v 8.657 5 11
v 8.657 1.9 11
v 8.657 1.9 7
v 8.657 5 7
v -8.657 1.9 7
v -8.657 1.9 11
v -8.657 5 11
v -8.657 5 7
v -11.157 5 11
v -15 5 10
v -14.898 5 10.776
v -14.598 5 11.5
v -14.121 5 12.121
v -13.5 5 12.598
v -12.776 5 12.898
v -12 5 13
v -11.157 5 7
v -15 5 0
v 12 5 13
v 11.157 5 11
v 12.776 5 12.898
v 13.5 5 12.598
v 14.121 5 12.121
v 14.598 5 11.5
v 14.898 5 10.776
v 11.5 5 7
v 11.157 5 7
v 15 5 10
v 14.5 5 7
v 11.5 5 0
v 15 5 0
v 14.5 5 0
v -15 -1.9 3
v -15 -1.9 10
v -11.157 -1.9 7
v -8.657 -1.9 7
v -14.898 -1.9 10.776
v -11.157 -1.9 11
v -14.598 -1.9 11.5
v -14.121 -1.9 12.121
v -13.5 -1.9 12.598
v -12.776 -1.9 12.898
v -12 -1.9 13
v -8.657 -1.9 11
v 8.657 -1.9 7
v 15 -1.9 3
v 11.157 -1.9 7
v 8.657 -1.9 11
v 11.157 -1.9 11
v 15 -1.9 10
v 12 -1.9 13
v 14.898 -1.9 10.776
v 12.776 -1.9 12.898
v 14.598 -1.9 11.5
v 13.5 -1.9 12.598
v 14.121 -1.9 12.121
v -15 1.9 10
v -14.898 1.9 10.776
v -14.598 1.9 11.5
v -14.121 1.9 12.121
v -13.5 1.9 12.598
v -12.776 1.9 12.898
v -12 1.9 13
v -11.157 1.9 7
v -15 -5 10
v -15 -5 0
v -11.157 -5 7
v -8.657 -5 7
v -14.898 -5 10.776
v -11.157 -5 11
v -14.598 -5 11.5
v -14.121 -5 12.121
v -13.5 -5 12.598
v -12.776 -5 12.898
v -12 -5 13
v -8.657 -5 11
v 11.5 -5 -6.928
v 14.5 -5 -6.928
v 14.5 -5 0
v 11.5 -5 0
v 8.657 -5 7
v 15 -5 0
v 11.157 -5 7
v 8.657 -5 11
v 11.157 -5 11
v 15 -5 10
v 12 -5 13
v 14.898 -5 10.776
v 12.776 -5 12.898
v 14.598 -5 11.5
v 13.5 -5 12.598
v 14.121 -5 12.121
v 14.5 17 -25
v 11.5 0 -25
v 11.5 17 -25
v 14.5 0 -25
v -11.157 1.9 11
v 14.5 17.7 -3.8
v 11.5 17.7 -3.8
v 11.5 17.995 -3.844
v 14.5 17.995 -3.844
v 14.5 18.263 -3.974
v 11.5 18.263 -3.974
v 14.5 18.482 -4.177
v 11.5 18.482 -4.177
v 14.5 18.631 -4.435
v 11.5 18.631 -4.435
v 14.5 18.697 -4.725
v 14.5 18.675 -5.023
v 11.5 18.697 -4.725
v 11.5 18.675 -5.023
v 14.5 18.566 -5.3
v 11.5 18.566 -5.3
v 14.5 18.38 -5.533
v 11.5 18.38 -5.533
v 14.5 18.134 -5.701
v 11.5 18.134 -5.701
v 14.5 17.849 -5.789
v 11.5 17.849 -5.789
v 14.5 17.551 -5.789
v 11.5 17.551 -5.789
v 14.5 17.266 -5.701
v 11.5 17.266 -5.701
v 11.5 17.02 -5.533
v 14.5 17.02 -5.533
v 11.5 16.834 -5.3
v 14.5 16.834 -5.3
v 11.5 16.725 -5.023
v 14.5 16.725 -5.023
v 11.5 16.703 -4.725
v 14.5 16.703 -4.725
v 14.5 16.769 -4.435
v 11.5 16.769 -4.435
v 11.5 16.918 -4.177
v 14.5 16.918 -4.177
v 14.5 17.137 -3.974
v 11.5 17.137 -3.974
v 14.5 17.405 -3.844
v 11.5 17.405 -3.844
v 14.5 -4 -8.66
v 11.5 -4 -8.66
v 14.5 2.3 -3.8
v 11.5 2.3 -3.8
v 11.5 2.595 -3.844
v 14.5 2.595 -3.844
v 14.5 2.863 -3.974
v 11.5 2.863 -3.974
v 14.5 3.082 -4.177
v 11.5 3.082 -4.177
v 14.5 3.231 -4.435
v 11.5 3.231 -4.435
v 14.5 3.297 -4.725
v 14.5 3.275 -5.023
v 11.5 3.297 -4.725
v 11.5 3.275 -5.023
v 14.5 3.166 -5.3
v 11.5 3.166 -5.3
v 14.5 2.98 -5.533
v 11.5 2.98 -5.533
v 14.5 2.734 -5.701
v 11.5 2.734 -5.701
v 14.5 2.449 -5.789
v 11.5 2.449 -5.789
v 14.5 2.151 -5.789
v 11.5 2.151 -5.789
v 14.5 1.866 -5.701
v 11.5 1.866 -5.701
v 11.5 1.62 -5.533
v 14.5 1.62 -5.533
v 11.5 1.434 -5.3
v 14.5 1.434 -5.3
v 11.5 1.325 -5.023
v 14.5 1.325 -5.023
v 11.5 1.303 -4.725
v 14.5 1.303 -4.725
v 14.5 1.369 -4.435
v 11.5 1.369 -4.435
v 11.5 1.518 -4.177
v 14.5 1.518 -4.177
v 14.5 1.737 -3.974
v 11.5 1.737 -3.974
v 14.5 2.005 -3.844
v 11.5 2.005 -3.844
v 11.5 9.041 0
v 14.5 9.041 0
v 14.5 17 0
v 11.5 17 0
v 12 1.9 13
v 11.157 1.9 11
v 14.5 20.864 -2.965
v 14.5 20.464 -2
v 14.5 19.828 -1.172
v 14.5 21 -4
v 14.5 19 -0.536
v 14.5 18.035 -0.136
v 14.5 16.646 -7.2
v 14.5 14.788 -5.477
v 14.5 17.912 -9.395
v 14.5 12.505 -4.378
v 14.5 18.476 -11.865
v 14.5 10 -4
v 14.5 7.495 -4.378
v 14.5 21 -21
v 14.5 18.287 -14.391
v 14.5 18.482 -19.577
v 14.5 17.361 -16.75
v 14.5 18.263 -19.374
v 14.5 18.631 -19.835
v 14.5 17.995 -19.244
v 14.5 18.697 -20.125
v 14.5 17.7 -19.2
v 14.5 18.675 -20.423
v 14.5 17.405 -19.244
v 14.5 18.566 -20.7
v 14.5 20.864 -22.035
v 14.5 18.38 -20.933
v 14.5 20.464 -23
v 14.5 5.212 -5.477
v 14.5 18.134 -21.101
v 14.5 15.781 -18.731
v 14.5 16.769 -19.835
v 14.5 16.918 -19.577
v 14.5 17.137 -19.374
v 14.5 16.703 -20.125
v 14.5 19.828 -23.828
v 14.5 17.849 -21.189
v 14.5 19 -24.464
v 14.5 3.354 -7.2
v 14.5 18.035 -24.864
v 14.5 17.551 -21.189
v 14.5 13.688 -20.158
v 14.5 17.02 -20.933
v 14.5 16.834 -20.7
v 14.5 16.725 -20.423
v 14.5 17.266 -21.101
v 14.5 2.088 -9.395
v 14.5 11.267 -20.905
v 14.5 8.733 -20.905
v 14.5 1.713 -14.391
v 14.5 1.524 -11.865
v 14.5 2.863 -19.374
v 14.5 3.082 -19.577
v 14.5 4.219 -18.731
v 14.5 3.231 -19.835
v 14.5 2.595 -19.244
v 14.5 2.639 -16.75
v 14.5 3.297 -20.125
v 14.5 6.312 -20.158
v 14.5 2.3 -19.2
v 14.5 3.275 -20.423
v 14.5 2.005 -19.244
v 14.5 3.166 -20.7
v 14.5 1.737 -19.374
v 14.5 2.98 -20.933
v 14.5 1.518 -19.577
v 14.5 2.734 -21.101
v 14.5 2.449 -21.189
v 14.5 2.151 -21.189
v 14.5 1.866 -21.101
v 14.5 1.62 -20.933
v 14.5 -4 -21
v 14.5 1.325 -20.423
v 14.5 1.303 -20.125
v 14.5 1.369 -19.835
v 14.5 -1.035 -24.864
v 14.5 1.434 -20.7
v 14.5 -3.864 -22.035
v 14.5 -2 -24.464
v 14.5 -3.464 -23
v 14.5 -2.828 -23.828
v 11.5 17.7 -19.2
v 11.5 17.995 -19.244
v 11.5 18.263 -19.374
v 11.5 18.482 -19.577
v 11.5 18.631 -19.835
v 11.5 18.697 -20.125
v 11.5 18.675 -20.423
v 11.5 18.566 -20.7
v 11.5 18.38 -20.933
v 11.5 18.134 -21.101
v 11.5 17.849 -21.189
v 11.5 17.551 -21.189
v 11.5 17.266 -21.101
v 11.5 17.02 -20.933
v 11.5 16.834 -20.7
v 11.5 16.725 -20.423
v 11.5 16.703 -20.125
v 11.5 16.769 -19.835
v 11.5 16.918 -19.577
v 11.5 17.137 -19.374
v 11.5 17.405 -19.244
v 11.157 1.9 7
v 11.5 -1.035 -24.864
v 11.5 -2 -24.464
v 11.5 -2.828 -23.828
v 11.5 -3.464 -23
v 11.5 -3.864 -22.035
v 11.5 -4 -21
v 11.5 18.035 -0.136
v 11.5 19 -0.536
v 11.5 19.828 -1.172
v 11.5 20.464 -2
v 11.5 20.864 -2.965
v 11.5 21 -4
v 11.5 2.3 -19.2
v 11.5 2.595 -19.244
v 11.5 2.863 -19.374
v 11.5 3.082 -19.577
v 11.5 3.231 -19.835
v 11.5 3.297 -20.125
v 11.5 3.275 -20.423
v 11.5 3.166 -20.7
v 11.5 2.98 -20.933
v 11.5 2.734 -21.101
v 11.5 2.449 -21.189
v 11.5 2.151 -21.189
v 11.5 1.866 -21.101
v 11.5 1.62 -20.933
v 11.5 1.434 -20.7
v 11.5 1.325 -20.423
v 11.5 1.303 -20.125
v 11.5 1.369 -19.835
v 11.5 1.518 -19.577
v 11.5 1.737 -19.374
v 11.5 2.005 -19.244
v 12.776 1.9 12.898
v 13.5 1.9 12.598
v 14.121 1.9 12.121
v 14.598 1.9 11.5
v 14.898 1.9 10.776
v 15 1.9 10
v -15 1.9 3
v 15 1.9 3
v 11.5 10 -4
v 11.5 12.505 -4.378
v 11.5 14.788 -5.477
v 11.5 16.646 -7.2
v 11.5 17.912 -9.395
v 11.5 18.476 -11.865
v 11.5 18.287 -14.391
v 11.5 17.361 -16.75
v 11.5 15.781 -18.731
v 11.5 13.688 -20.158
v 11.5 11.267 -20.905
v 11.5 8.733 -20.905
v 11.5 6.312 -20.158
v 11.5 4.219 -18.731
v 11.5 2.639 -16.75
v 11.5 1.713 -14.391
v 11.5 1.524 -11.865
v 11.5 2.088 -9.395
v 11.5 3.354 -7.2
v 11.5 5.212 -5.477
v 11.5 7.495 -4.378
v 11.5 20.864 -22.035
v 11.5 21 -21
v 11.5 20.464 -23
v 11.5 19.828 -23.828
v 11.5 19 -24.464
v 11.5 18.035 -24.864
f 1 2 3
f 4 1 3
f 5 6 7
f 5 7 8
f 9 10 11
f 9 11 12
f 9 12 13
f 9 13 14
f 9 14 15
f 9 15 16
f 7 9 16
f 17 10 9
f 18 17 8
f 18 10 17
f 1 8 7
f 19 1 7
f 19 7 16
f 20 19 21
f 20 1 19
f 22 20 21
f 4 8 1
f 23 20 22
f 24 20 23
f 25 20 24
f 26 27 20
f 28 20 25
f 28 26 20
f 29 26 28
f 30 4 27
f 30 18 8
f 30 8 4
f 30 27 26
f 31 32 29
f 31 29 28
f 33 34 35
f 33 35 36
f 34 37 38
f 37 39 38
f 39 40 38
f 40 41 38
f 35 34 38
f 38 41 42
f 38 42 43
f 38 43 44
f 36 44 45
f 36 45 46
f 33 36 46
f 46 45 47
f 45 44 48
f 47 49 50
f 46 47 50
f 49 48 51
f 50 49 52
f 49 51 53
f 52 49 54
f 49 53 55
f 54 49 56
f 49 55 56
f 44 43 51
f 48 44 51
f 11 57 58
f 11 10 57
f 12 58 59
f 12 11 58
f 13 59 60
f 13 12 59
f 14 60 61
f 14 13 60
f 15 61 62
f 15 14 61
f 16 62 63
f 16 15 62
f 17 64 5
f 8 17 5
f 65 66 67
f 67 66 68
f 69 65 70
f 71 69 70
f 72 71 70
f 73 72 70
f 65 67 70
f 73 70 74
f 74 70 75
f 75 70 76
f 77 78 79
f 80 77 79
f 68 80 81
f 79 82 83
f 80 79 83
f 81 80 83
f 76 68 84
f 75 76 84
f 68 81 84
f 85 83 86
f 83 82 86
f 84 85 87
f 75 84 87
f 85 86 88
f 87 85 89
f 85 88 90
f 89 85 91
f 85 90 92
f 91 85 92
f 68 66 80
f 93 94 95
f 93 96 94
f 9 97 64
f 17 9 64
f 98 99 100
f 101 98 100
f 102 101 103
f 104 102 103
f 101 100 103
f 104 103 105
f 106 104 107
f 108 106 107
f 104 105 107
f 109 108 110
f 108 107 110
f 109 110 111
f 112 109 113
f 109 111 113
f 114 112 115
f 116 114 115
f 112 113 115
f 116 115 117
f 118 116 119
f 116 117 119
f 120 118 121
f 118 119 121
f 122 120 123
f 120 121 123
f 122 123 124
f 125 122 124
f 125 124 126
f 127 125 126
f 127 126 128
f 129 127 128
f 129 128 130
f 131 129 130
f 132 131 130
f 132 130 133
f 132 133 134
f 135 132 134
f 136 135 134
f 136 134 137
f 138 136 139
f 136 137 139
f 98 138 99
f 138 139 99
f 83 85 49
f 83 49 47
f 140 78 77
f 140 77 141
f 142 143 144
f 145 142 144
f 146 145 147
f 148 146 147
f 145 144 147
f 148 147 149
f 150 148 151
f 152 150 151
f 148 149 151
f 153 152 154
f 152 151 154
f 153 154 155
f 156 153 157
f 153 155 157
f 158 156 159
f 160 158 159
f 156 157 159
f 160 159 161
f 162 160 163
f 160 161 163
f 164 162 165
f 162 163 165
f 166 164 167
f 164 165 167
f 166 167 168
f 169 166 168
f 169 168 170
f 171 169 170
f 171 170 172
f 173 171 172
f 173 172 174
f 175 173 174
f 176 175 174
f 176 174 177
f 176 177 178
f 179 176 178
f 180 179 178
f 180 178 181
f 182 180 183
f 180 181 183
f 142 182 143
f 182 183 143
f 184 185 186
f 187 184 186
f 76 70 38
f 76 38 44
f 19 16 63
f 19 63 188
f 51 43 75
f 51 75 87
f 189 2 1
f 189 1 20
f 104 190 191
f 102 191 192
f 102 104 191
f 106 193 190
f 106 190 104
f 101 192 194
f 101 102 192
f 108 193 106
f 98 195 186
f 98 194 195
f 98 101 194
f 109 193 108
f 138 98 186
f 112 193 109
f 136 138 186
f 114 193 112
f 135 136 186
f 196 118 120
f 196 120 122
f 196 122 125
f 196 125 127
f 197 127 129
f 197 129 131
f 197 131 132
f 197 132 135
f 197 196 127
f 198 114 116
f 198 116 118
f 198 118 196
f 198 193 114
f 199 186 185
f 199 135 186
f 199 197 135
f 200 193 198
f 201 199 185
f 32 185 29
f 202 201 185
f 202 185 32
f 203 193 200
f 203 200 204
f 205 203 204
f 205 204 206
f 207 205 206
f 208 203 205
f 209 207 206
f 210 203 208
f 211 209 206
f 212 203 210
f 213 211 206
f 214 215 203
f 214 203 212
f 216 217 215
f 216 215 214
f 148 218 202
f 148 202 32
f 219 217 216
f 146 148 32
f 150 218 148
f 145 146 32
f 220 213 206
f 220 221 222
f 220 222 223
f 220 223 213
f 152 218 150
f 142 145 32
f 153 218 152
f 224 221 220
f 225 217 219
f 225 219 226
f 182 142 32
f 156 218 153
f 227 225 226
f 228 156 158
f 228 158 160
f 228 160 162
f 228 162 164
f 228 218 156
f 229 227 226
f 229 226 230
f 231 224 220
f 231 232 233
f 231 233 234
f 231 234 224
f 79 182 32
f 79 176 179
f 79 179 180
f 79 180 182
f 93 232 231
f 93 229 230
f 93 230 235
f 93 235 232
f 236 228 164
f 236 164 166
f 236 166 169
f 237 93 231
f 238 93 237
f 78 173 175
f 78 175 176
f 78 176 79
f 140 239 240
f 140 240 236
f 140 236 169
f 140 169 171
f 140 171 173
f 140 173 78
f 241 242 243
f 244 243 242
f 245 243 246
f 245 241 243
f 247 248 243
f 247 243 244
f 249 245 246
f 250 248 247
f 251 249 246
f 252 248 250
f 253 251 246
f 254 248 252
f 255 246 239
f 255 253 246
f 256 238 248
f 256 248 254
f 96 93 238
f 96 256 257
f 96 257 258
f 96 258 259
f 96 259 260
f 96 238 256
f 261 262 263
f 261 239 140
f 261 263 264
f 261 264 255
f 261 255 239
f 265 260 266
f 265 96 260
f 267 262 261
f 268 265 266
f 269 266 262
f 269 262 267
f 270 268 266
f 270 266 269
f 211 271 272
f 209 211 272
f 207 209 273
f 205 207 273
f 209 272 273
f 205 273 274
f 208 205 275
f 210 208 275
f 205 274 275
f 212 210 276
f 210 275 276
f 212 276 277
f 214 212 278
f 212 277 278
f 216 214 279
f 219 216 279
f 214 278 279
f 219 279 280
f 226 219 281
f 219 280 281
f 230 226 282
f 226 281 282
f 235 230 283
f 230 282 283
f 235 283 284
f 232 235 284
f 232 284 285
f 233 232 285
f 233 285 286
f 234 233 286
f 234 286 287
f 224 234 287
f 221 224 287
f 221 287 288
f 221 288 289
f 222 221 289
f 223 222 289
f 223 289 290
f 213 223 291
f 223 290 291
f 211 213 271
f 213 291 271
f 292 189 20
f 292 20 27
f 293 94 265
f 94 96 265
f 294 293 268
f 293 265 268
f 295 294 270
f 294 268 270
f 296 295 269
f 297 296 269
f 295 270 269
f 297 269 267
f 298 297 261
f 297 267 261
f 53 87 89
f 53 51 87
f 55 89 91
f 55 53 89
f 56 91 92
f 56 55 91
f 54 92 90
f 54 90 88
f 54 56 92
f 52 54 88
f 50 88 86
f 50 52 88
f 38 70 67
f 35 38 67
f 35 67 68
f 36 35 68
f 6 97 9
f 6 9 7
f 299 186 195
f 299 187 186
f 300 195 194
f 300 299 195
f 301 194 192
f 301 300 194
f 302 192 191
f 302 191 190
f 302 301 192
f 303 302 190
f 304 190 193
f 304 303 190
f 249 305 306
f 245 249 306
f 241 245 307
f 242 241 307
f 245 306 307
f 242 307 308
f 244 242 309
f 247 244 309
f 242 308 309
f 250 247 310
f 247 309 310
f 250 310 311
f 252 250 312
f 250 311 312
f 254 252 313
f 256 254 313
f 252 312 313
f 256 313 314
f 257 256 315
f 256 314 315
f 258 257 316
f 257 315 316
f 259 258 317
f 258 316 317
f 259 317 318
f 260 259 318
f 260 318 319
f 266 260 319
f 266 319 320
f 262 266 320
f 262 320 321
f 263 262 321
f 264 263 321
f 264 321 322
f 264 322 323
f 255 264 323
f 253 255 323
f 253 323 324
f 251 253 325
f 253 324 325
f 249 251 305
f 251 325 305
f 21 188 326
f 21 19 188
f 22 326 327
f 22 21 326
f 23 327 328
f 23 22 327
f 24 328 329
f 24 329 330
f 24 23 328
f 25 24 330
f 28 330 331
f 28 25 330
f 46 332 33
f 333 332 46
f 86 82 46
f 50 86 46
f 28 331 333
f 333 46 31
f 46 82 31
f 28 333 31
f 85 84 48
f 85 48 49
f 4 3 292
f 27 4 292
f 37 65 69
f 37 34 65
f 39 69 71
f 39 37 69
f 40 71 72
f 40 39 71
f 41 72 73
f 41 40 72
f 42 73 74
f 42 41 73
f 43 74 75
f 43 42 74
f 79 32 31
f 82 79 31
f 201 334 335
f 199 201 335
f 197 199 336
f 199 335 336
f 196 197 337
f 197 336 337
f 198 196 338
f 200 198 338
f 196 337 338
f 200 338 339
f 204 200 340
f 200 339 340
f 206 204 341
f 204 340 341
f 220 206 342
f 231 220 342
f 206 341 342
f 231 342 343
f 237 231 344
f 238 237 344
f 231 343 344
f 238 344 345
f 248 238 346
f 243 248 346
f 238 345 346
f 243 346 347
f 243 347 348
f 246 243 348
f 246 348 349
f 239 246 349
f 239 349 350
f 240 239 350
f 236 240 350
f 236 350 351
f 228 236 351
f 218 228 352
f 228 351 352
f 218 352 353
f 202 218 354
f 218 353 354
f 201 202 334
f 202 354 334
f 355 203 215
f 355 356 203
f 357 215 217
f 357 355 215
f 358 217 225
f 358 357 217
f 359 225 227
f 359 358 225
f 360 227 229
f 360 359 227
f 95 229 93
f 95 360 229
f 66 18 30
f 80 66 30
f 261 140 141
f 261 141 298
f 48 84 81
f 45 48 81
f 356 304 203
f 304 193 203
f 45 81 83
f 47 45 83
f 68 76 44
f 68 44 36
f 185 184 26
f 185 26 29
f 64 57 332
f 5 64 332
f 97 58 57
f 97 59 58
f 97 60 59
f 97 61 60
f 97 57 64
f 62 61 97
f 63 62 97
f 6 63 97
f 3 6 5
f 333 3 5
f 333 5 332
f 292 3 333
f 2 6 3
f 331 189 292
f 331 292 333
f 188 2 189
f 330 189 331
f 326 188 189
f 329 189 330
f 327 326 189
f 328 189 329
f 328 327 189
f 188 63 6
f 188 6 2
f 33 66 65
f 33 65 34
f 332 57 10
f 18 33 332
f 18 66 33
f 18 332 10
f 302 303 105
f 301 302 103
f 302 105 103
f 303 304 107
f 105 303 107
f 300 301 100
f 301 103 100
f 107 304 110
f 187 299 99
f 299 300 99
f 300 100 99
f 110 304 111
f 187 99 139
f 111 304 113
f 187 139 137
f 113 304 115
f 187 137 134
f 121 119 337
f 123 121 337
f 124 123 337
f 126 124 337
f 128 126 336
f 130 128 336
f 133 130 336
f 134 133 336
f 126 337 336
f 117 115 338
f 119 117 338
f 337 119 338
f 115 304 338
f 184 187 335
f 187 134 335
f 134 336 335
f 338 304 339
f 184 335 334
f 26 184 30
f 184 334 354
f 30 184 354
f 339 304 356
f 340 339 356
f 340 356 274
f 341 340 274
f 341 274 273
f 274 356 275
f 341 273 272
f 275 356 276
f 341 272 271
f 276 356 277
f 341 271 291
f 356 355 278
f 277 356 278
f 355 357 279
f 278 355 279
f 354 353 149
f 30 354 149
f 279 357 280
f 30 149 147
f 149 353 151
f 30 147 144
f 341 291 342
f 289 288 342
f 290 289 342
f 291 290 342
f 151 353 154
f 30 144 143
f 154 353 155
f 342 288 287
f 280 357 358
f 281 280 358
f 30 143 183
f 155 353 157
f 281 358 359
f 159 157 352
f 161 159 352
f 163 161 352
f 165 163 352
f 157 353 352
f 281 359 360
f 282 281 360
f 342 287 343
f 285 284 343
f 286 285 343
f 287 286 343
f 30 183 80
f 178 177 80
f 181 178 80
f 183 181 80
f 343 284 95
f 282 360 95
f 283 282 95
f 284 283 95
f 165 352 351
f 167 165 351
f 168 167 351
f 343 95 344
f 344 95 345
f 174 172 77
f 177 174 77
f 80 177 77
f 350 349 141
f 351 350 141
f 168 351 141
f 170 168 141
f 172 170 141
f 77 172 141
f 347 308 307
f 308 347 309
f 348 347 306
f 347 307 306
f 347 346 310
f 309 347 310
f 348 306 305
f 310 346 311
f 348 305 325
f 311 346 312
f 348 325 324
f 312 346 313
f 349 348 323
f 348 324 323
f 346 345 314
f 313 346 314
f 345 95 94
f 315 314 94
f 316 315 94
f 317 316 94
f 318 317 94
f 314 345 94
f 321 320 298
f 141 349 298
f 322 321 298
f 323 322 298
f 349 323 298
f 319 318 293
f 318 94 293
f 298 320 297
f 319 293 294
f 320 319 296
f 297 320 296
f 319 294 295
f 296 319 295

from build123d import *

# Parameters (mm, degrees)
ESBO_O1_W                  = 30
ESBO_O1_H                  = 10
RESSALTO_EXTRUS_O1_DEPTH   = 13
ESBO_O2_W                  = 30
ESBO_O2_H                  = 3.8
CORTE_EXTRUS_O1_DEPTH      = 10
FILETE1_R                  = 3
CORTE_EXTRUS_O2_DEPTH      = 23.226110771
CORTE_EXTRUS_O2_DEPTH_BACK = 23.226110771
ESBO_O3_W                  = 2.5
ESBO_O3_H                  = 4
ESBO_O4_W                  = 25
ESBO_O4_H                  = 25
RESSALTO_EXTRUS_O2_DEPTH   = 1.5
CHANFRO1_SIZE              = 5
CHANFRO1_SIZE_2            = 8.660254038
CHANFRO2_SIZE              = 7
CHANFRO2_SIZE2             = 4.041451884
ESBO_O5_R                  = 8.5
ESBO_O5_R_2                = 1
CORTE_EXTRUS_O3_DEPTH      = 3
FILETE2_R                  = 4


with BuildPart() as part:
    # Esboço1 → Ressalto-extrusão1 (new body)
    with BuildSketch(Plane.XY):
        Rectangle(ESBO_O1_W, ESBO_O1_H)
    extrude(amount=RESSALTO_EXTRUS_O1_DEPTH)

    # Esboço2 → Corte-extrusão1 (cut)
    with BuildSketch(Plane.XY.offset(13)):
        Rectangle(ESBO_O2_W, ESBO_O2_H)
    extrude(amount=-CORTE_EXTRUS_O1_DEPTH, mode=Mode.SUBTRACT)

    # Filete1
    filete1_edges = [part.edges().sort_by_distance(p)[0] for p in [
        (-15, 3.45, 13),
        (15, 3.45, 13),
        (-15, -3.45, 13),
        (15, -3.45, 13),
    ]]
    fillet(filete1_edges, radius=FILETE1_R)

    # Esboço3 → Corte-extrusão2 (cut, two sides: drawn at the far end of the back side and taken through both)
    with BuildSketch(Plane(origin=(0, 5, 0), x_dir=(1, 0, 0), z_dir=(0, 1, 0)).offset(-CORTE_EXTRUS_O2_DEPTH_BACK)):
        with Locations((9.906768391, -9)):
            Rectangle(ESBO_O3_W, ESBO_O3_H)
        with Locations((-9.906768391, -9)):
            Rectangle(ESBO_O3_W, ESBO_O3_H)
    extrude(amount=CORTE_EXTRUS_O2_DEPTH + CORTE_EXTRUS_O2_DEPTH_BACK, mode=Mode.SUBTRACT)

    # Esboço4 → Ressalto-extrusão2 (add, symmetric)
    with BuildSketch(Plane(origin=(13, 0, 0), x_dir=(0, 0, -1), z_dir=(1, 0, 0))):
        with Locations((12.5, 8.5)):
            Rectangle(ESBO_O4_W, ESBO_O4_H)
    extrude(amount=RESSALTO_EXTRUS_O2_DEPTH, both=True)

    # Chanfro1
    # the kernel refuses this chamfer: 8.660254038, 5 mm, written as the material it adds along each edge
    with BuildSketch(Plane(origin=(11.5, -4, 0), x_dir=(0, -0.9983227437537924, 0.05789386240267202), z_dir=(1, 0, 0))) as chanfro1_piece_1_section:
        Polygon((CHANFRO1_SIZE * 0.998322743754, CHANFRO1_SIZE * 0.0578938624027), (-CHANFRO1_SIZE_2 * 0.0578938624016, CHANFRO1_SIZE_2 * 0.998322743736), (0, 0), align=None)
    chanfro1_piece_1 = extrude(amount=3, mode=Mode.PRIVATE)
    chanfro1_piece_1 = split(chanfro1_piece_1, bisect_by=Plane(origin=(13, -5, -4.055902091), z_dir=(0, 1, 0)), keep=Keep.TOP, mode=Mode.PRIVATE)
    add(chanfro1_piece_1)

    # Chanfro2
    chanfro2_edges = [part.edges().sort_by_distance(p)[0] for p in [
        (13, 5, 0),
    ]]
    chanfro2_side = [part.faces().sort_by_distance(p)[0] for p in [
        (0, 5, 6.301932384),
    ]]
    chamfer(chanfro2_edges, length=CHANFRO2_SIZE, length2=CHANFRO2_SIZE2, reference=chanfro2_side[0])

    # Esboço5 → Corte-extrusão3 (cut)
    with BuildSketch(Plane.ZY.offset(-11.5)):
        with Locations((-12.5, 10)):
            Circle(ESBO_O5_R)
        with Locations((-20.2, 17.7)):
            Circle(ESBO_O5_R_2)
        with Locations((-4.8, 17.7)):
            Circle(ESBO_O5_R_2)
        with Locations((-4.8, 2.3)):
            Circle(ESBO_O5_R_2)
        with Locations((-20.2, 2.3)):
            Circle(ESBO_O5_R_2)
    extrude(amount=-CORTE_EXTRUS_O3_DEPTH, mode=Mode.SUBTRACT)

    # Filete2
    filete2_edges = [part.edges().sort_by_distance(p)[0] for p in [
        (13, 21, 0),
        (13, 21, -25),
        (13, -4, -25),
    ]]
    fillet(filete2_edges, radius=FILETE2_R)


solid = part.part
